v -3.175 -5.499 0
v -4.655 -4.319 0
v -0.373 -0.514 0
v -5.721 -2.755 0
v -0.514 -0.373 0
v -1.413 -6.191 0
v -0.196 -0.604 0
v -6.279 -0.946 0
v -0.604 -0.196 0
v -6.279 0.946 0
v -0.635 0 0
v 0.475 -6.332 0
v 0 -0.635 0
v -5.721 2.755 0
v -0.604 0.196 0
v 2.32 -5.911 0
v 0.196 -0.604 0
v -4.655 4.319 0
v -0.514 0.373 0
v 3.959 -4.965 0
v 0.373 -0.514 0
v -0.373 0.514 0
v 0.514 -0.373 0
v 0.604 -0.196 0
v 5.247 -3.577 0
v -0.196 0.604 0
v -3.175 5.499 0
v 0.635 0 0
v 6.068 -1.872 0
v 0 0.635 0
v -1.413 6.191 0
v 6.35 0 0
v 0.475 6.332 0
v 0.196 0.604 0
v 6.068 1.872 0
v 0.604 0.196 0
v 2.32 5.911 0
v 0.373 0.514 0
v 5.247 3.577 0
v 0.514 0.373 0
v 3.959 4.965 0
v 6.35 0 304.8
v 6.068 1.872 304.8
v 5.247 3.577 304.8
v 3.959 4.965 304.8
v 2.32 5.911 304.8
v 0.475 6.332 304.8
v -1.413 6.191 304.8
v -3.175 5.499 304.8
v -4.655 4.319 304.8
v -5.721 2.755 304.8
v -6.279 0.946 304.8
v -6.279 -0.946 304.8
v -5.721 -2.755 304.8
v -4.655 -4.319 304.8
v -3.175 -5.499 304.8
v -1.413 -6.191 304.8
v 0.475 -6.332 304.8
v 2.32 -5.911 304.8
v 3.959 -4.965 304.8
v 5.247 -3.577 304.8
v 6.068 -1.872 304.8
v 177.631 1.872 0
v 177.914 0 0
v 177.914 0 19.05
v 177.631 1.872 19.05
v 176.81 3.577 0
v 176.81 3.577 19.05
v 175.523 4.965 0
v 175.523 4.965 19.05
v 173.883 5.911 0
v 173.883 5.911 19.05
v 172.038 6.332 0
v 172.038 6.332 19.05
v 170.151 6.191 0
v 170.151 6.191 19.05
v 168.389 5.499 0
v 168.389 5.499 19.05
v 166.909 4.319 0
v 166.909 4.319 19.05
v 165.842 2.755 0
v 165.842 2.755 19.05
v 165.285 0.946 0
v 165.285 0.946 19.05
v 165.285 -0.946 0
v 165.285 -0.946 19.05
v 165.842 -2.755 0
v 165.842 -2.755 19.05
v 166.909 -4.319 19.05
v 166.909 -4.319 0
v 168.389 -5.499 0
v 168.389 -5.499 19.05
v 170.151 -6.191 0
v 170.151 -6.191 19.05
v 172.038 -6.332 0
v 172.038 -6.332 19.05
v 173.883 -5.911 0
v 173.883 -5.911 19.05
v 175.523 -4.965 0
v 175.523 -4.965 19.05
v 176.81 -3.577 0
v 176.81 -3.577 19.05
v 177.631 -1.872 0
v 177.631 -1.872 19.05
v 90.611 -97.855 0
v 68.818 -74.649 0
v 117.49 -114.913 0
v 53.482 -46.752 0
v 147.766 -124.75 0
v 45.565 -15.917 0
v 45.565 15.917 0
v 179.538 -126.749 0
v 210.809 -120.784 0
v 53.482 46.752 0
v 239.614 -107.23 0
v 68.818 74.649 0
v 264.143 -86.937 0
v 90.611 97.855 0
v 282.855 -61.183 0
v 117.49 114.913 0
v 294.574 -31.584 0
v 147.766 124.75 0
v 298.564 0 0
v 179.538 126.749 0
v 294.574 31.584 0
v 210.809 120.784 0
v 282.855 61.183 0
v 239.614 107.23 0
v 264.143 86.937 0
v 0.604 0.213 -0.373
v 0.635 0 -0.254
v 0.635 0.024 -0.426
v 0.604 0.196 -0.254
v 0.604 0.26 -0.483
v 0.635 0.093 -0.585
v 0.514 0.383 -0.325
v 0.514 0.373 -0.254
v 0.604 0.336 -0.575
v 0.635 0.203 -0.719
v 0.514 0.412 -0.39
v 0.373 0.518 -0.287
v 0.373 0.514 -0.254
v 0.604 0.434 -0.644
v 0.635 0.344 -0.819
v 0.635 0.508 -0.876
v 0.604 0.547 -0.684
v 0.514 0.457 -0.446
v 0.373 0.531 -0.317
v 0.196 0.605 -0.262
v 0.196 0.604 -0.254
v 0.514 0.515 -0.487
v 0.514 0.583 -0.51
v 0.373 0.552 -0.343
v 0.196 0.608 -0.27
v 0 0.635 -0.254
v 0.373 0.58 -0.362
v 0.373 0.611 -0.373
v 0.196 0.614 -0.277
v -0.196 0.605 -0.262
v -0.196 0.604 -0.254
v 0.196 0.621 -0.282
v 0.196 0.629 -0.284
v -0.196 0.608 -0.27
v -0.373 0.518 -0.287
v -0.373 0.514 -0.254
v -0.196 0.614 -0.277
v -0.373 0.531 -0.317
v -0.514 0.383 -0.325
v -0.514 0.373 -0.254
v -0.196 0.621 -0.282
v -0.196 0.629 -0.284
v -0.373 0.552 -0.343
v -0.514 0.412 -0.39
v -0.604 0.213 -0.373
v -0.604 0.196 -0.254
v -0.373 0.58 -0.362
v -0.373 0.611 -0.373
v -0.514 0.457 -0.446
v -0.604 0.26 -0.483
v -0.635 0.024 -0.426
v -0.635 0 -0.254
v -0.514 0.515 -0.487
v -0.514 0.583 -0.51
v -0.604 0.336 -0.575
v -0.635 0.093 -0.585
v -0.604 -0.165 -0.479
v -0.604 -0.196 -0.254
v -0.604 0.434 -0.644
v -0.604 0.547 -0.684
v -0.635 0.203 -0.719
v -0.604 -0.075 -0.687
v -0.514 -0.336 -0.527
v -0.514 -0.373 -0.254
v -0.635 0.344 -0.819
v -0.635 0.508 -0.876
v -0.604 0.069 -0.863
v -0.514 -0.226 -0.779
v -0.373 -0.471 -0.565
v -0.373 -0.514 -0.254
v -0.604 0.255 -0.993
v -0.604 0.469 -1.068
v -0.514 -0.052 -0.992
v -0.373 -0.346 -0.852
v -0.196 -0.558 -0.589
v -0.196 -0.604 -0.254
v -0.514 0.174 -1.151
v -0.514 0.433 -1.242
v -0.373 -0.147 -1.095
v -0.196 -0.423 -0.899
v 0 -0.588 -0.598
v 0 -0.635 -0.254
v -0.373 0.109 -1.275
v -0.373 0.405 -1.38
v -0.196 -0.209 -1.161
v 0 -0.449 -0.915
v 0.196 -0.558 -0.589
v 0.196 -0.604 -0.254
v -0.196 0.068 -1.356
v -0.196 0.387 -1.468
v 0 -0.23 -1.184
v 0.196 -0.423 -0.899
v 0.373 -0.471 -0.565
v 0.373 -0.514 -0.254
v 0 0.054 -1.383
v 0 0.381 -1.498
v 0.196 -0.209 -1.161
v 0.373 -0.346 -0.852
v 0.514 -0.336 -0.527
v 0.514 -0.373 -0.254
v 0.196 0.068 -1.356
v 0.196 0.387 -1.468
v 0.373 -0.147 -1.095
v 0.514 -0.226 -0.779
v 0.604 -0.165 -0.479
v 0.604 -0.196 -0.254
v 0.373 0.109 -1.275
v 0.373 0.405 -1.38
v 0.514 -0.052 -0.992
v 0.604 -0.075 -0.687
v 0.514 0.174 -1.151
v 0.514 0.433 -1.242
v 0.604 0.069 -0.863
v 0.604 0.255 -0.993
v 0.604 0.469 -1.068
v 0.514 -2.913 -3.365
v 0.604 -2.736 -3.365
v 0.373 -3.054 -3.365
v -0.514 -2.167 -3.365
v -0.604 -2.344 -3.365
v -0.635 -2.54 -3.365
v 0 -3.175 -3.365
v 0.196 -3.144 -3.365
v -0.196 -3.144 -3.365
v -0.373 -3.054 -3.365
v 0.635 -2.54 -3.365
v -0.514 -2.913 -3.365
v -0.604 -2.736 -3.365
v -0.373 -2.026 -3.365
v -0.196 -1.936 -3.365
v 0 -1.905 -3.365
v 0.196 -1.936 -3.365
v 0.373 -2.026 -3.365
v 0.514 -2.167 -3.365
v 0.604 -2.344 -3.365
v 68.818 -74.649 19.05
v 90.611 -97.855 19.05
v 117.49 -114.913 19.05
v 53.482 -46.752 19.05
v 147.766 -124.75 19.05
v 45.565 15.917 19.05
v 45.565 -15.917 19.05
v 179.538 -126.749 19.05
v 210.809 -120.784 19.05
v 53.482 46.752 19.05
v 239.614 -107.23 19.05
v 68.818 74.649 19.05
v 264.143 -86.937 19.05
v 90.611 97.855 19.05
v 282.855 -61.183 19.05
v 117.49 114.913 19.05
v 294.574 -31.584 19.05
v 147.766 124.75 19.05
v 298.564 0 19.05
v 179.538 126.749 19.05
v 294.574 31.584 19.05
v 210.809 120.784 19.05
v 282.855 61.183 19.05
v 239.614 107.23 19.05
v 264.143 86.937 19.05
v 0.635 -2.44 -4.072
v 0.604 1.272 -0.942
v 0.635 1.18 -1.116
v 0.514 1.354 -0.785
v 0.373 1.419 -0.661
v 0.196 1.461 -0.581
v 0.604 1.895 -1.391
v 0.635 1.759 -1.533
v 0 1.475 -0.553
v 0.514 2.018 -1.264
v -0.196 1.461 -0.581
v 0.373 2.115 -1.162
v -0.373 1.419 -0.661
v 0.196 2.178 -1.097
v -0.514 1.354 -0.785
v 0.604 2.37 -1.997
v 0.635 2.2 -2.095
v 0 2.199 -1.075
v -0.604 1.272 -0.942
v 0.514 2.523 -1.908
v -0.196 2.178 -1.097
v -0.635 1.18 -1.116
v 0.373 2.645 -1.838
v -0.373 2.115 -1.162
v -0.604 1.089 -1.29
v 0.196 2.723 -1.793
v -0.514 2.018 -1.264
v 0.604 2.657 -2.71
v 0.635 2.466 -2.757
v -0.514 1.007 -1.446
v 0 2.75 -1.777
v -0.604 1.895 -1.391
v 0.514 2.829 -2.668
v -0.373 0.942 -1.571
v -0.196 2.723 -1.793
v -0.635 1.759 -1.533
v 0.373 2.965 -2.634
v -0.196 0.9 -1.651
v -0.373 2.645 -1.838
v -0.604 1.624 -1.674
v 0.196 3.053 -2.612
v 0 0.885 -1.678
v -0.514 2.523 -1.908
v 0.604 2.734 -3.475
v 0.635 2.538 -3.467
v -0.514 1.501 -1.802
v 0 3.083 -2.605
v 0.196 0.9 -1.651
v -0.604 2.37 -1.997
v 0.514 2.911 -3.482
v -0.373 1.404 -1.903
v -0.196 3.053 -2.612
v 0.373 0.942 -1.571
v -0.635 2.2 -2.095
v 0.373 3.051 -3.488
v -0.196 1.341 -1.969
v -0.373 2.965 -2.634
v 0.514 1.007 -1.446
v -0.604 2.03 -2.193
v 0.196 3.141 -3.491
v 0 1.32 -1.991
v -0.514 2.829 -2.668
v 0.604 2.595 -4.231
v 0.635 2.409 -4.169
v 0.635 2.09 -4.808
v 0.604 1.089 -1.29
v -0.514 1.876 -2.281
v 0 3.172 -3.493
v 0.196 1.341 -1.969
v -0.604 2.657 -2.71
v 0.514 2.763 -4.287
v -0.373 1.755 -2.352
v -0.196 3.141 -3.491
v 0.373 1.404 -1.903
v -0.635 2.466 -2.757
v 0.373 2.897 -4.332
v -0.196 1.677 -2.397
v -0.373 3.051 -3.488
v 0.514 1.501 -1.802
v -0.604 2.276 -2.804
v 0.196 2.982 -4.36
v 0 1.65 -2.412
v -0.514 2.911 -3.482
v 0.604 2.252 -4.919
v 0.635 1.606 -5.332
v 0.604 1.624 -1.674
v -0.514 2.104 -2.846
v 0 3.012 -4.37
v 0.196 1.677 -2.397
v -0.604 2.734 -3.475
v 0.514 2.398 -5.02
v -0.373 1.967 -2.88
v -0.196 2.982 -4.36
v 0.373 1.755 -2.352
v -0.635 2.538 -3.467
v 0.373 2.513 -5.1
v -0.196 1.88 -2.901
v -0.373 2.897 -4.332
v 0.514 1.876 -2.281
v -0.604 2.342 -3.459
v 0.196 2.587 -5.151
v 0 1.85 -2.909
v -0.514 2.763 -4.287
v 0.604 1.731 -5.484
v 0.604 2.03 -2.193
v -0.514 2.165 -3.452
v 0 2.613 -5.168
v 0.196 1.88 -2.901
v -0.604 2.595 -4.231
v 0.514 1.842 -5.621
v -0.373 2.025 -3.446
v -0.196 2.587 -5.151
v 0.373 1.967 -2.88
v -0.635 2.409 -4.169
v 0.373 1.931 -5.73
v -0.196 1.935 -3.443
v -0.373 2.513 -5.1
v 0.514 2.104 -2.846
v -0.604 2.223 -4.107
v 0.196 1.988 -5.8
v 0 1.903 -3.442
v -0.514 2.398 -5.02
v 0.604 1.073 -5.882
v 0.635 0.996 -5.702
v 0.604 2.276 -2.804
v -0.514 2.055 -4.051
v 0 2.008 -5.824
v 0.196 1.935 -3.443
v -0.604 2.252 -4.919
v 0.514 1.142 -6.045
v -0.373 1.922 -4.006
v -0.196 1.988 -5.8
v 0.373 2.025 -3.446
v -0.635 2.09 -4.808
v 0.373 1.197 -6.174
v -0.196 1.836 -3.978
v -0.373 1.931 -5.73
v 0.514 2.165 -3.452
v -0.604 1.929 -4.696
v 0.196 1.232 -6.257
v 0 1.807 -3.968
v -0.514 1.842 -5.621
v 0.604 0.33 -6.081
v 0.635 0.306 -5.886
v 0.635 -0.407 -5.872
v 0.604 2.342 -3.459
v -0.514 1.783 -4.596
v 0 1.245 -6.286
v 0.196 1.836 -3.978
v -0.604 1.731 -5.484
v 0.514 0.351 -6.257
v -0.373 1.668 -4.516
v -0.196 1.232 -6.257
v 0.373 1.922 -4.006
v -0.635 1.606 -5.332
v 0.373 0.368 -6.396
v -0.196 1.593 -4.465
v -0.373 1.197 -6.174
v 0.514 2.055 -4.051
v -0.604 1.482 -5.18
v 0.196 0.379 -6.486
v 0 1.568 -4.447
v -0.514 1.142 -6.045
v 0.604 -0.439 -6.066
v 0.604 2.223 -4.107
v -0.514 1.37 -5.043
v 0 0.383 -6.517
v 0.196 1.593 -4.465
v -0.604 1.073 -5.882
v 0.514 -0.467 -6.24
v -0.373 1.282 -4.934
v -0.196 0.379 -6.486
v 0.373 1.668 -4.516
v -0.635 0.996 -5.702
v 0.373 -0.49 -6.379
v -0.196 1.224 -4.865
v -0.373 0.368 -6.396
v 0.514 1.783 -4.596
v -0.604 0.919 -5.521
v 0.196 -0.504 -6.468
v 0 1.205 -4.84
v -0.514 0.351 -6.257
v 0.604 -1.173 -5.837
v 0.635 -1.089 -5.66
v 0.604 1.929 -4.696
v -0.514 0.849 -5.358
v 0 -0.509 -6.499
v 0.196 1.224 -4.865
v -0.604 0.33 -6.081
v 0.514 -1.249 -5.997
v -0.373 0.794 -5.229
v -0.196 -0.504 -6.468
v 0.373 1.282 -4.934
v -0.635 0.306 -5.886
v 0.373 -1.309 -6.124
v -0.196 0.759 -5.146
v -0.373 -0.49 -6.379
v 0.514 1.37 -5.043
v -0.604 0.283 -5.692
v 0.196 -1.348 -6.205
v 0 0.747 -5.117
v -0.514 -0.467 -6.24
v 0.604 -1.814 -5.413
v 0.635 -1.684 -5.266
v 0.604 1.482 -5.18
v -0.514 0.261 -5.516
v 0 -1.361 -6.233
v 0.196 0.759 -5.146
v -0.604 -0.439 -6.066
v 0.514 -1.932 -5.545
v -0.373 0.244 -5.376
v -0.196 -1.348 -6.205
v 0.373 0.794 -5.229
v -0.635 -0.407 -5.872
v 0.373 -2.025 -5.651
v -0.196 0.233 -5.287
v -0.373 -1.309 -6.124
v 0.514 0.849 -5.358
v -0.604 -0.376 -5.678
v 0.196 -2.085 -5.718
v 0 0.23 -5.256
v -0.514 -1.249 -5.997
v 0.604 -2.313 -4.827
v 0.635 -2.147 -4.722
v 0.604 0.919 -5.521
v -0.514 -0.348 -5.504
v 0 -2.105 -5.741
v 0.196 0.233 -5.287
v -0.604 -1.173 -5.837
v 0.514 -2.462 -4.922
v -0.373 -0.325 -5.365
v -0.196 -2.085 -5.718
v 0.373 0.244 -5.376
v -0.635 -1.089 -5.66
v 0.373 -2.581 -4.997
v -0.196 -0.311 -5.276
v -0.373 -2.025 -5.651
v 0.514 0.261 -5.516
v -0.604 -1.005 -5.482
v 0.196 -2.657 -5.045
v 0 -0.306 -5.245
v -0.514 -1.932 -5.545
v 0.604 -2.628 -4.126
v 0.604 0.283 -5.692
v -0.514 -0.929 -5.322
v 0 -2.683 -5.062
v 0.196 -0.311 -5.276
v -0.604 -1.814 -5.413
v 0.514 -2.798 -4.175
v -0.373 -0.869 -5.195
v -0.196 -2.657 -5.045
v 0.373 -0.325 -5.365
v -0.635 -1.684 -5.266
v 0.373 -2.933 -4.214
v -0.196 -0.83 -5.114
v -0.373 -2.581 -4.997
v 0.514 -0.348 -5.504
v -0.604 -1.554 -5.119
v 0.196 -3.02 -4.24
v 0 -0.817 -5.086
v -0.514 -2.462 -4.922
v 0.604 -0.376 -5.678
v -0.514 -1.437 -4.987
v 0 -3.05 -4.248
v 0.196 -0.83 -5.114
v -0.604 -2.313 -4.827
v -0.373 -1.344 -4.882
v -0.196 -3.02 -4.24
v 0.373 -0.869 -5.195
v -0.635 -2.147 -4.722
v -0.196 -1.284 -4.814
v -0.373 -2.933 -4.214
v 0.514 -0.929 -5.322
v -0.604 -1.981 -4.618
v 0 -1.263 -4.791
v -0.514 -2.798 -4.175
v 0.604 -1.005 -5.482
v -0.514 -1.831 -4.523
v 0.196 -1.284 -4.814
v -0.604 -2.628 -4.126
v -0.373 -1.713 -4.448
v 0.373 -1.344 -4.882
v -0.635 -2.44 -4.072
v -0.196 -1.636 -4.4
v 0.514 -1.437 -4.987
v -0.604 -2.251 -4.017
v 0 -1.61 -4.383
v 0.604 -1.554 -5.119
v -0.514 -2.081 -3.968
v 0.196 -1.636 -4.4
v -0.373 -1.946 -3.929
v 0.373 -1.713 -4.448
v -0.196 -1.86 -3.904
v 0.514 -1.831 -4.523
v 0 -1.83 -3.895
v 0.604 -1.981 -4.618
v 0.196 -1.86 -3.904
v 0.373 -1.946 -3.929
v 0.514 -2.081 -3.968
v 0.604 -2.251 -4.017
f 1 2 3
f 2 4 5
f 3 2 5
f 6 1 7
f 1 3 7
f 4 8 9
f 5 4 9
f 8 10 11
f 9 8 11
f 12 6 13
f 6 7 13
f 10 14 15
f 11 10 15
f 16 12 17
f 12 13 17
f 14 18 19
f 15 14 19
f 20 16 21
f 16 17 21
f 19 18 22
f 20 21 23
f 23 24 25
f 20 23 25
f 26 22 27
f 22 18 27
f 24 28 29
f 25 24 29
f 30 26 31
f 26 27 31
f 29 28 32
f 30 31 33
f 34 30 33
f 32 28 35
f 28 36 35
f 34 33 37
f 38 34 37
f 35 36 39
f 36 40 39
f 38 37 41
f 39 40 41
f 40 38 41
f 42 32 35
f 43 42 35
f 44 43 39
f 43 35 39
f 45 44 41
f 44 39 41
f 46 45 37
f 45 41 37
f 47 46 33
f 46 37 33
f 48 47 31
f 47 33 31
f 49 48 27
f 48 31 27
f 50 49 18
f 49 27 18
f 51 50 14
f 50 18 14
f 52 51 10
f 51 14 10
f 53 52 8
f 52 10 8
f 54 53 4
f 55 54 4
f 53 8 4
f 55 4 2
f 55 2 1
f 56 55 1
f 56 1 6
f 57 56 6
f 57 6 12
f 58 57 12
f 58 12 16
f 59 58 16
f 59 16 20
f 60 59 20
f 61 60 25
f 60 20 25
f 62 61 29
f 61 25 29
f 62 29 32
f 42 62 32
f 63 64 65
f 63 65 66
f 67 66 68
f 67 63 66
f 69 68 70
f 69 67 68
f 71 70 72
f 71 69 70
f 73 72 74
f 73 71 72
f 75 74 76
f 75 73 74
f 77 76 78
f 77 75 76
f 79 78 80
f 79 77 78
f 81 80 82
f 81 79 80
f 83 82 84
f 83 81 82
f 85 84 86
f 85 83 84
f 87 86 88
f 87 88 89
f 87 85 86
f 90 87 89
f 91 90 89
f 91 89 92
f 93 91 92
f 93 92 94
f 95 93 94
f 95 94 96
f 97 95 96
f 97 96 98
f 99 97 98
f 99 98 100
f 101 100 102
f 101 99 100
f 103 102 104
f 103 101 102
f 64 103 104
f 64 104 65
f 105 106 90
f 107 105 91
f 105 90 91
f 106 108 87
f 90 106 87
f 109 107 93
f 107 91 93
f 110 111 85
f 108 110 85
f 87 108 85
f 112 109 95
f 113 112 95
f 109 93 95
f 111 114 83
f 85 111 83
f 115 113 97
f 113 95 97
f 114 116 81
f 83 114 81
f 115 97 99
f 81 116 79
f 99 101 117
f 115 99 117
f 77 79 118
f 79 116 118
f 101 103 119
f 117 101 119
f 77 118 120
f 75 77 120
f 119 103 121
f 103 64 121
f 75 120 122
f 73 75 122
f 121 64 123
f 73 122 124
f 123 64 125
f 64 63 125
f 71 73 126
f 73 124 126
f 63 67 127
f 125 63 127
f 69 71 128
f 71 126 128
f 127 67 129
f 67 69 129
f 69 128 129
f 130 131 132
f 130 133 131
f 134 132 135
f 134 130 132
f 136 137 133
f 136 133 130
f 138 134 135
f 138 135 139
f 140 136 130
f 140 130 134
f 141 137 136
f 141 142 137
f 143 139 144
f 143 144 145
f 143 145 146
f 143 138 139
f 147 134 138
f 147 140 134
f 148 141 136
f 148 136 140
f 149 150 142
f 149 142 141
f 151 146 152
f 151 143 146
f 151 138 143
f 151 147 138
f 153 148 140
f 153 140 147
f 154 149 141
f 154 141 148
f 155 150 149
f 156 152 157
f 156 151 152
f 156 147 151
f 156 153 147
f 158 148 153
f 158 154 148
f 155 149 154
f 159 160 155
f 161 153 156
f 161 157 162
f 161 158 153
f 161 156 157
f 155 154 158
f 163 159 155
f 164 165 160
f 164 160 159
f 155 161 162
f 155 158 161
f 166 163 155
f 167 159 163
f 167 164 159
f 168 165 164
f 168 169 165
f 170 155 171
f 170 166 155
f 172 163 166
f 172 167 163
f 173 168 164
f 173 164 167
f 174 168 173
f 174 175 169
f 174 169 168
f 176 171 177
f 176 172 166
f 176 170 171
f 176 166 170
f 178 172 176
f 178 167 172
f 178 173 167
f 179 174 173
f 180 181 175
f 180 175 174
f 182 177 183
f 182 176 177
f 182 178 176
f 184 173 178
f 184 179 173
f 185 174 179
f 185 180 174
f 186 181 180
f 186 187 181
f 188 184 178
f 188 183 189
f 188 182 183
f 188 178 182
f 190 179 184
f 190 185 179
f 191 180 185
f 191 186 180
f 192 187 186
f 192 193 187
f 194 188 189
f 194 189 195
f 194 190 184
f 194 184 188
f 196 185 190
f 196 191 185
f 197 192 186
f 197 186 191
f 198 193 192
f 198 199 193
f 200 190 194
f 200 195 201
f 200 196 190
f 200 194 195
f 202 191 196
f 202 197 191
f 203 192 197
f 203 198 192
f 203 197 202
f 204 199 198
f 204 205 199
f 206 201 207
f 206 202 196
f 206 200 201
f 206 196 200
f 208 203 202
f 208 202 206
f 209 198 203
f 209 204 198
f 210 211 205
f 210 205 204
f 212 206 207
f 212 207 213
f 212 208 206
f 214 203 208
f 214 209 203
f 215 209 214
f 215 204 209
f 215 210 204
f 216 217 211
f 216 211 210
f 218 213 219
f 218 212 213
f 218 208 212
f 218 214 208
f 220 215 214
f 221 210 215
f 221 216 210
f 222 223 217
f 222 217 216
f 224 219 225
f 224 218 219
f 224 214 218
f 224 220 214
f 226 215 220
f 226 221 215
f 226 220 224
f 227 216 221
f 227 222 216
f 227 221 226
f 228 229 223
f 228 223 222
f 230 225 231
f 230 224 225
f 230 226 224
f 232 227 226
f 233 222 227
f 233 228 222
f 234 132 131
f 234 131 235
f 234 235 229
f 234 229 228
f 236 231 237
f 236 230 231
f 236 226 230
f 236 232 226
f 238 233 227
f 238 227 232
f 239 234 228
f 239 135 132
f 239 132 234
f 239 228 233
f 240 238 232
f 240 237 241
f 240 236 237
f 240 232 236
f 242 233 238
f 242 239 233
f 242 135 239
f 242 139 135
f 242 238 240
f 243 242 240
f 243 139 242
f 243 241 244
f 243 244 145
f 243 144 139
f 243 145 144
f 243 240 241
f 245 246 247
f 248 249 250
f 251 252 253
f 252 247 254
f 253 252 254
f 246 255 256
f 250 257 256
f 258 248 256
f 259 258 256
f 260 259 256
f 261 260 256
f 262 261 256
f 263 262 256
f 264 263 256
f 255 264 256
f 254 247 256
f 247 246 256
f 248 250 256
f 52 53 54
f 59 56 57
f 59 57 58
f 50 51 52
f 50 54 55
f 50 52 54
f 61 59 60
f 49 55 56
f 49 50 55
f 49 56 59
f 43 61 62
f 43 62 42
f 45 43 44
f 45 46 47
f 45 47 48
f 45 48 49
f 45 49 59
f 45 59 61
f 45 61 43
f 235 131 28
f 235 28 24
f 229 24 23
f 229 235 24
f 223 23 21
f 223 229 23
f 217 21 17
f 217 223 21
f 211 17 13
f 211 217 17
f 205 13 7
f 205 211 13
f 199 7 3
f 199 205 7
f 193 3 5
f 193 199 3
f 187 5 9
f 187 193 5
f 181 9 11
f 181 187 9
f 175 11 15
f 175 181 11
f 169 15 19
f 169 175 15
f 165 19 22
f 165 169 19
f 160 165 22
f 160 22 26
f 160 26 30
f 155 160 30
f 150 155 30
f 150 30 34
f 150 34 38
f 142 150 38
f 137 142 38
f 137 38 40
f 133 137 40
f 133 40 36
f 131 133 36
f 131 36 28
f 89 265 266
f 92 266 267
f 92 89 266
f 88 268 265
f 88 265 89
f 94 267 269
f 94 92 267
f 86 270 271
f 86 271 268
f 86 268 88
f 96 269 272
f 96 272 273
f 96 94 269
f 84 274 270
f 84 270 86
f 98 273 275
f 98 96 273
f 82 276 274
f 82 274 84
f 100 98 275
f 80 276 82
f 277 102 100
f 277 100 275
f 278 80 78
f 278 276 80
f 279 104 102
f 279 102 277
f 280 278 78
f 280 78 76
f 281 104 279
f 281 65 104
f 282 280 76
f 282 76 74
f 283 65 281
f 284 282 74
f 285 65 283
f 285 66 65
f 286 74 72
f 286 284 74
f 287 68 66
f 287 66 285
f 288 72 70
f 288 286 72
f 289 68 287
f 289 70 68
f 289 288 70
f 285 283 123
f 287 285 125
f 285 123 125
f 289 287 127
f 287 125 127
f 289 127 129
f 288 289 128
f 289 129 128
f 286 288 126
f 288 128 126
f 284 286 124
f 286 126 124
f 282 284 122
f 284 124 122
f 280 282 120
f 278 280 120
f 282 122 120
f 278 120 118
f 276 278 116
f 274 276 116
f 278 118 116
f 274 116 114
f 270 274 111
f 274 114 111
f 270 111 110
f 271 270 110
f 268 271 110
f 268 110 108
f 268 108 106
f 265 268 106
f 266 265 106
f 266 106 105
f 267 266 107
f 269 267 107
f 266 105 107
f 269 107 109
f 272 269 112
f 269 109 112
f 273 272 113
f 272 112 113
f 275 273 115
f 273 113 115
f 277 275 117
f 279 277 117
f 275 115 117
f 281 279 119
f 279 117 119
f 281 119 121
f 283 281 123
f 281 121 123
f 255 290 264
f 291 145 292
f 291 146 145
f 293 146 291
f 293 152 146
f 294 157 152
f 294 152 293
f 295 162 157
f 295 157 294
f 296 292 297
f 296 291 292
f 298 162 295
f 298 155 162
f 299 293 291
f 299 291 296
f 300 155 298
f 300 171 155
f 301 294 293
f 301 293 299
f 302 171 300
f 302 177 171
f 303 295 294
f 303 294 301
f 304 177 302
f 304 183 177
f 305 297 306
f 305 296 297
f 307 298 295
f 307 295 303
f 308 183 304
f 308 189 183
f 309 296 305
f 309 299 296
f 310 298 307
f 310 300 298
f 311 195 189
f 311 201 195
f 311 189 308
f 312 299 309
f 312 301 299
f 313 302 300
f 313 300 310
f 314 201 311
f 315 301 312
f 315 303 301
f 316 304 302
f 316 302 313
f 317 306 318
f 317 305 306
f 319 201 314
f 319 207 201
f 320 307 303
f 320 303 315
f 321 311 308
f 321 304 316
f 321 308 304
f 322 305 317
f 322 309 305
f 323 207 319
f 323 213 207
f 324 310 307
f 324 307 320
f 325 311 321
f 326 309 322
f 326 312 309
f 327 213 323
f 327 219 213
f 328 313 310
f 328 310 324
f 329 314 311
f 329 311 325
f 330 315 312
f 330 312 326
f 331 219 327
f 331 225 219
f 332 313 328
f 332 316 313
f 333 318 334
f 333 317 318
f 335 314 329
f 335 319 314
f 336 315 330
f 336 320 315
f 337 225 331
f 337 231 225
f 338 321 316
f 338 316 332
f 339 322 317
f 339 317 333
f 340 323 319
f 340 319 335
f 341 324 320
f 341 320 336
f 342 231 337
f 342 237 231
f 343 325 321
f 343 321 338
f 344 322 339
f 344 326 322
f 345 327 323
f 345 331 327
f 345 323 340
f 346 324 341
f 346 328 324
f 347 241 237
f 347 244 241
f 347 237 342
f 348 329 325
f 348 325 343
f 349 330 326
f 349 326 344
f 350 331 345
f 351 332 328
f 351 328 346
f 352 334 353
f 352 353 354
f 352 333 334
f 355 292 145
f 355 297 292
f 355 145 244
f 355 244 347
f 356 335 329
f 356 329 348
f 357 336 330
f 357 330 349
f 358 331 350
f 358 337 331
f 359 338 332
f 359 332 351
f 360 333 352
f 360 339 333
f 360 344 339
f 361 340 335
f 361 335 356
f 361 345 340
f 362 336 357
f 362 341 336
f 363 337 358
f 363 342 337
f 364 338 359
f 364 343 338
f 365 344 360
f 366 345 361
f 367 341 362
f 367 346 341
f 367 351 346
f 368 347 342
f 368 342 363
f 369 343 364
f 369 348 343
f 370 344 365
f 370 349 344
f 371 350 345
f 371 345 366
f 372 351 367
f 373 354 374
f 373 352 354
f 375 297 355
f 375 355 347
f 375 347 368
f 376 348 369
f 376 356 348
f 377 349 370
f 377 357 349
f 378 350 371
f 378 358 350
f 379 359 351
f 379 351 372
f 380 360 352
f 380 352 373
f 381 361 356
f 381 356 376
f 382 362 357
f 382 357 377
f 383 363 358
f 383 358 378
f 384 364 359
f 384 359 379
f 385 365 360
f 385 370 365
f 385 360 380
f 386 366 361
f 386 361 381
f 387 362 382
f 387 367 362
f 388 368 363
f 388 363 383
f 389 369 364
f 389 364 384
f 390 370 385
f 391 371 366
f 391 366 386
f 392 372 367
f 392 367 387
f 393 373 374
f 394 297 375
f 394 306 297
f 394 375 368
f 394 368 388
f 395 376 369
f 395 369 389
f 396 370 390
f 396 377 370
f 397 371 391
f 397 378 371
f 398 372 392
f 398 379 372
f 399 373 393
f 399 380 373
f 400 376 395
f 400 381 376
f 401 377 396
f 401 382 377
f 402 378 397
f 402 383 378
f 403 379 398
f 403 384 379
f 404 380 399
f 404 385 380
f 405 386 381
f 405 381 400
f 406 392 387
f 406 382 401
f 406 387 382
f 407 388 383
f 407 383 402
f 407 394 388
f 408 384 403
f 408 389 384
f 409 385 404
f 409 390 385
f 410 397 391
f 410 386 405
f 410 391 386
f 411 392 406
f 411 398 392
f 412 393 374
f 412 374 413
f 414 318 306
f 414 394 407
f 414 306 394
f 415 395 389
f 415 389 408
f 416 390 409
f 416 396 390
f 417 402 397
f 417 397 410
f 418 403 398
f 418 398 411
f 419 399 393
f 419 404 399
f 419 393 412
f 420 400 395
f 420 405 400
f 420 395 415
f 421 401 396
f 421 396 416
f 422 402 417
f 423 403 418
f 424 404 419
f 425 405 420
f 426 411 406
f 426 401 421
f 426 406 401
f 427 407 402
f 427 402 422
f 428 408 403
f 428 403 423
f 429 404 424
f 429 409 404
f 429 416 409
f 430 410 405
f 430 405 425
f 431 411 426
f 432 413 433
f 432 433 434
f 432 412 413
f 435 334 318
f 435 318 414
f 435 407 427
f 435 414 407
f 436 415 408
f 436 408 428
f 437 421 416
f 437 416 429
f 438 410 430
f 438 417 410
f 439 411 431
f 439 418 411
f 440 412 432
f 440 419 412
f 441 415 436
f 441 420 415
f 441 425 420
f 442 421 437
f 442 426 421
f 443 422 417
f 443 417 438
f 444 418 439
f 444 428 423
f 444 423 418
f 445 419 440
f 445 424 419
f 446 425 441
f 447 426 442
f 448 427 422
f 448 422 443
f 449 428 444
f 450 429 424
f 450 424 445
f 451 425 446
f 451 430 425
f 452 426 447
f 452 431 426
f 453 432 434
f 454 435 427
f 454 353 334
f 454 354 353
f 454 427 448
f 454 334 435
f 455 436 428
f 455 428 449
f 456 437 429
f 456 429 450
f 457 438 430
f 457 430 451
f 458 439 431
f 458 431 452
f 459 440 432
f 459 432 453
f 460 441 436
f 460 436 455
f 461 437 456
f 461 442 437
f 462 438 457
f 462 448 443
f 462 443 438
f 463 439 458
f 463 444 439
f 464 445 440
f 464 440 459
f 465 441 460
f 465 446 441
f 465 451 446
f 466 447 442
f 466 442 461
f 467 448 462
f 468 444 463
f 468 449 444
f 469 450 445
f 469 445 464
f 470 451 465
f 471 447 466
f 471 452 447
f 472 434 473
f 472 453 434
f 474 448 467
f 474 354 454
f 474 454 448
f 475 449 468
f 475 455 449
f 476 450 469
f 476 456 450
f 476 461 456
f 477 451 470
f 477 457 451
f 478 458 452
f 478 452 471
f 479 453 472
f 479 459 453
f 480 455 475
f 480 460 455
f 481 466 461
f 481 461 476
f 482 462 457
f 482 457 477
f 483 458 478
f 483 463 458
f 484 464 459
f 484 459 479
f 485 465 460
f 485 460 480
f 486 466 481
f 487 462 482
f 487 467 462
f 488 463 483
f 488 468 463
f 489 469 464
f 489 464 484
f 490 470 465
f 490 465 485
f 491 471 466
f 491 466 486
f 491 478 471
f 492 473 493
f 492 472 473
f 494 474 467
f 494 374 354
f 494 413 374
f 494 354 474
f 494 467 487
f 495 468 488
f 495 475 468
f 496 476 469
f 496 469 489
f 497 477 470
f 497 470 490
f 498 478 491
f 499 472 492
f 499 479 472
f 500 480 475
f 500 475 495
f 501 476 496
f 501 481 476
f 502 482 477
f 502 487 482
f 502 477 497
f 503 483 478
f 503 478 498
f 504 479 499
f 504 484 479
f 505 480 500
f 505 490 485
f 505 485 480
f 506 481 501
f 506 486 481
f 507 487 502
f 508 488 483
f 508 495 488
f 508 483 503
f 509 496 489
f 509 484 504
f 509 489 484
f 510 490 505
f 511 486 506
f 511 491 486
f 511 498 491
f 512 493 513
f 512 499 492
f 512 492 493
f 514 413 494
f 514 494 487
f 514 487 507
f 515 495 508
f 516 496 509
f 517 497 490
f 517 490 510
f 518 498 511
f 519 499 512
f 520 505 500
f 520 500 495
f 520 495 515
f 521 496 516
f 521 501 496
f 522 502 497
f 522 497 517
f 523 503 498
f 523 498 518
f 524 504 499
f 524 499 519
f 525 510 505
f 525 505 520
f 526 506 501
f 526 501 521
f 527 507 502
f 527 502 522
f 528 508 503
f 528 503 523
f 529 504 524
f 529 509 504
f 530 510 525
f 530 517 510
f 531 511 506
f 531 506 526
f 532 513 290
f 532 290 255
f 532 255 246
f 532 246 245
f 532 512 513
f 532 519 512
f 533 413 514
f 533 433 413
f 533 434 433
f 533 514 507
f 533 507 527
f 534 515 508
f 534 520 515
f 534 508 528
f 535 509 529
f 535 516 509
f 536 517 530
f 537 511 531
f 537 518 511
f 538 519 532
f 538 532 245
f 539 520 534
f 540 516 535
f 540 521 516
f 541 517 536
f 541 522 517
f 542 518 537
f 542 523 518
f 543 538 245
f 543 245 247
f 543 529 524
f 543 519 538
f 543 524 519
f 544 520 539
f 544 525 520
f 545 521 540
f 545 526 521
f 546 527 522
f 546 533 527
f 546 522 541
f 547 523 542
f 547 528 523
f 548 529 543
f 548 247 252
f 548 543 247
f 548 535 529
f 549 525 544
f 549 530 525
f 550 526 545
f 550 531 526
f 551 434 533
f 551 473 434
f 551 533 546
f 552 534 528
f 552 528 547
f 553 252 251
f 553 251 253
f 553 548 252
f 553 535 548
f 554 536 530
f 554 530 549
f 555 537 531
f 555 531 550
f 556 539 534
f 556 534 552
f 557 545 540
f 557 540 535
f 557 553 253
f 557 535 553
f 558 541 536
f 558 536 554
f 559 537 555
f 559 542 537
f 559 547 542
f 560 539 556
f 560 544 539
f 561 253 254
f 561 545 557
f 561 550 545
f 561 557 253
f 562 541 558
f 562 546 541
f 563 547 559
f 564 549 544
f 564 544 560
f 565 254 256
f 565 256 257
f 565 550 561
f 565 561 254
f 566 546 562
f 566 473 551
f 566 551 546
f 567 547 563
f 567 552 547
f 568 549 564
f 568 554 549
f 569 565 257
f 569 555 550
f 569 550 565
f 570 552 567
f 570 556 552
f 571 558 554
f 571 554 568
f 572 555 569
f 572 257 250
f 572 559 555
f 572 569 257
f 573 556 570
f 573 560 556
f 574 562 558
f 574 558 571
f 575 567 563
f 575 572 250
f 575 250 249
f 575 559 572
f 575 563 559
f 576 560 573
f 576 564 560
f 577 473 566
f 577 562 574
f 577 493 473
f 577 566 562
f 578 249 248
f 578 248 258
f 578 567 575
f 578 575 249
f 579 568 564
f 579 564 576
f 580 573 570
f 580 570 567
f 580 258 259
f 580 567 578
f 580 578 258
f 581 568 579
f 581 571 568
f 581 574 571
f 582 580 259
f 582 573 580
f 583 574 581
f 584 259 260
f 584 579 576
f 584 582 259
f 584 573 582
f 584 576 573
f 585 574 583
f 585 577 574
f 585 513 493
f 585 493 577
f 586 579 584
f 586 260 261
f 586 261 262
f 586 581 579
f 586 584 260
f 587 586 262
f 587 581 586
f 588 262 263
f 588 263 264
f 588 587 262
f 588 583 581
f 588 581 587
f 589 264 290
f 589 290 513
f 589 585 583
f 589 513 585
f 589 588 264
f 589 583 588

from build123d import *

# Parameters (mm, degrees)
F0_R     = 6.35
F1_DEPTH = 304.8
F0_R_2   = 127
F2_DEPTH = 19.05
F4_R     = 0.635


with BuildPart() as f1:
    # F0 (on Top) → F1 (new body)
    with BuildSketch(Plane.XY):
        Circle(F0_R)
    extrude(amount=F1_DEPTH)

    # F5: sweep along a path in F3
    with BuildLine(Plane.YZ) as f5_path:
        Line((0, 0), (0, -0.254))
        ThreePointArc((0, -0.254), (0.143131115, -0.6556092628), (0.508, -0.8761703947))
        ThreePointArc((0.508, -0.8761703947), (1.6064370514, -5.3323275132), (-2.54, -3.3648519733))
    # F4 (on face) → F5 (sweep)
    with BuildSketch(Plane.XY):
        Circle(F4_R)
    sweep(path=f5_path.line)


with BuildPart() as f2:
    # F0 (on Top) → F2 (new body)
    with BuildSketch(Plane.XY):
        with Locations((171.5635806322, 0)):
            Circle(F0_R_2)
        with Locations((171.5635806322, 0)):
            Circle(F0_R, mode=Mode.SUBTRACT)
    extrude(amount=F2_DEPTH)


solid = Compound([f1.part, f2.part])
